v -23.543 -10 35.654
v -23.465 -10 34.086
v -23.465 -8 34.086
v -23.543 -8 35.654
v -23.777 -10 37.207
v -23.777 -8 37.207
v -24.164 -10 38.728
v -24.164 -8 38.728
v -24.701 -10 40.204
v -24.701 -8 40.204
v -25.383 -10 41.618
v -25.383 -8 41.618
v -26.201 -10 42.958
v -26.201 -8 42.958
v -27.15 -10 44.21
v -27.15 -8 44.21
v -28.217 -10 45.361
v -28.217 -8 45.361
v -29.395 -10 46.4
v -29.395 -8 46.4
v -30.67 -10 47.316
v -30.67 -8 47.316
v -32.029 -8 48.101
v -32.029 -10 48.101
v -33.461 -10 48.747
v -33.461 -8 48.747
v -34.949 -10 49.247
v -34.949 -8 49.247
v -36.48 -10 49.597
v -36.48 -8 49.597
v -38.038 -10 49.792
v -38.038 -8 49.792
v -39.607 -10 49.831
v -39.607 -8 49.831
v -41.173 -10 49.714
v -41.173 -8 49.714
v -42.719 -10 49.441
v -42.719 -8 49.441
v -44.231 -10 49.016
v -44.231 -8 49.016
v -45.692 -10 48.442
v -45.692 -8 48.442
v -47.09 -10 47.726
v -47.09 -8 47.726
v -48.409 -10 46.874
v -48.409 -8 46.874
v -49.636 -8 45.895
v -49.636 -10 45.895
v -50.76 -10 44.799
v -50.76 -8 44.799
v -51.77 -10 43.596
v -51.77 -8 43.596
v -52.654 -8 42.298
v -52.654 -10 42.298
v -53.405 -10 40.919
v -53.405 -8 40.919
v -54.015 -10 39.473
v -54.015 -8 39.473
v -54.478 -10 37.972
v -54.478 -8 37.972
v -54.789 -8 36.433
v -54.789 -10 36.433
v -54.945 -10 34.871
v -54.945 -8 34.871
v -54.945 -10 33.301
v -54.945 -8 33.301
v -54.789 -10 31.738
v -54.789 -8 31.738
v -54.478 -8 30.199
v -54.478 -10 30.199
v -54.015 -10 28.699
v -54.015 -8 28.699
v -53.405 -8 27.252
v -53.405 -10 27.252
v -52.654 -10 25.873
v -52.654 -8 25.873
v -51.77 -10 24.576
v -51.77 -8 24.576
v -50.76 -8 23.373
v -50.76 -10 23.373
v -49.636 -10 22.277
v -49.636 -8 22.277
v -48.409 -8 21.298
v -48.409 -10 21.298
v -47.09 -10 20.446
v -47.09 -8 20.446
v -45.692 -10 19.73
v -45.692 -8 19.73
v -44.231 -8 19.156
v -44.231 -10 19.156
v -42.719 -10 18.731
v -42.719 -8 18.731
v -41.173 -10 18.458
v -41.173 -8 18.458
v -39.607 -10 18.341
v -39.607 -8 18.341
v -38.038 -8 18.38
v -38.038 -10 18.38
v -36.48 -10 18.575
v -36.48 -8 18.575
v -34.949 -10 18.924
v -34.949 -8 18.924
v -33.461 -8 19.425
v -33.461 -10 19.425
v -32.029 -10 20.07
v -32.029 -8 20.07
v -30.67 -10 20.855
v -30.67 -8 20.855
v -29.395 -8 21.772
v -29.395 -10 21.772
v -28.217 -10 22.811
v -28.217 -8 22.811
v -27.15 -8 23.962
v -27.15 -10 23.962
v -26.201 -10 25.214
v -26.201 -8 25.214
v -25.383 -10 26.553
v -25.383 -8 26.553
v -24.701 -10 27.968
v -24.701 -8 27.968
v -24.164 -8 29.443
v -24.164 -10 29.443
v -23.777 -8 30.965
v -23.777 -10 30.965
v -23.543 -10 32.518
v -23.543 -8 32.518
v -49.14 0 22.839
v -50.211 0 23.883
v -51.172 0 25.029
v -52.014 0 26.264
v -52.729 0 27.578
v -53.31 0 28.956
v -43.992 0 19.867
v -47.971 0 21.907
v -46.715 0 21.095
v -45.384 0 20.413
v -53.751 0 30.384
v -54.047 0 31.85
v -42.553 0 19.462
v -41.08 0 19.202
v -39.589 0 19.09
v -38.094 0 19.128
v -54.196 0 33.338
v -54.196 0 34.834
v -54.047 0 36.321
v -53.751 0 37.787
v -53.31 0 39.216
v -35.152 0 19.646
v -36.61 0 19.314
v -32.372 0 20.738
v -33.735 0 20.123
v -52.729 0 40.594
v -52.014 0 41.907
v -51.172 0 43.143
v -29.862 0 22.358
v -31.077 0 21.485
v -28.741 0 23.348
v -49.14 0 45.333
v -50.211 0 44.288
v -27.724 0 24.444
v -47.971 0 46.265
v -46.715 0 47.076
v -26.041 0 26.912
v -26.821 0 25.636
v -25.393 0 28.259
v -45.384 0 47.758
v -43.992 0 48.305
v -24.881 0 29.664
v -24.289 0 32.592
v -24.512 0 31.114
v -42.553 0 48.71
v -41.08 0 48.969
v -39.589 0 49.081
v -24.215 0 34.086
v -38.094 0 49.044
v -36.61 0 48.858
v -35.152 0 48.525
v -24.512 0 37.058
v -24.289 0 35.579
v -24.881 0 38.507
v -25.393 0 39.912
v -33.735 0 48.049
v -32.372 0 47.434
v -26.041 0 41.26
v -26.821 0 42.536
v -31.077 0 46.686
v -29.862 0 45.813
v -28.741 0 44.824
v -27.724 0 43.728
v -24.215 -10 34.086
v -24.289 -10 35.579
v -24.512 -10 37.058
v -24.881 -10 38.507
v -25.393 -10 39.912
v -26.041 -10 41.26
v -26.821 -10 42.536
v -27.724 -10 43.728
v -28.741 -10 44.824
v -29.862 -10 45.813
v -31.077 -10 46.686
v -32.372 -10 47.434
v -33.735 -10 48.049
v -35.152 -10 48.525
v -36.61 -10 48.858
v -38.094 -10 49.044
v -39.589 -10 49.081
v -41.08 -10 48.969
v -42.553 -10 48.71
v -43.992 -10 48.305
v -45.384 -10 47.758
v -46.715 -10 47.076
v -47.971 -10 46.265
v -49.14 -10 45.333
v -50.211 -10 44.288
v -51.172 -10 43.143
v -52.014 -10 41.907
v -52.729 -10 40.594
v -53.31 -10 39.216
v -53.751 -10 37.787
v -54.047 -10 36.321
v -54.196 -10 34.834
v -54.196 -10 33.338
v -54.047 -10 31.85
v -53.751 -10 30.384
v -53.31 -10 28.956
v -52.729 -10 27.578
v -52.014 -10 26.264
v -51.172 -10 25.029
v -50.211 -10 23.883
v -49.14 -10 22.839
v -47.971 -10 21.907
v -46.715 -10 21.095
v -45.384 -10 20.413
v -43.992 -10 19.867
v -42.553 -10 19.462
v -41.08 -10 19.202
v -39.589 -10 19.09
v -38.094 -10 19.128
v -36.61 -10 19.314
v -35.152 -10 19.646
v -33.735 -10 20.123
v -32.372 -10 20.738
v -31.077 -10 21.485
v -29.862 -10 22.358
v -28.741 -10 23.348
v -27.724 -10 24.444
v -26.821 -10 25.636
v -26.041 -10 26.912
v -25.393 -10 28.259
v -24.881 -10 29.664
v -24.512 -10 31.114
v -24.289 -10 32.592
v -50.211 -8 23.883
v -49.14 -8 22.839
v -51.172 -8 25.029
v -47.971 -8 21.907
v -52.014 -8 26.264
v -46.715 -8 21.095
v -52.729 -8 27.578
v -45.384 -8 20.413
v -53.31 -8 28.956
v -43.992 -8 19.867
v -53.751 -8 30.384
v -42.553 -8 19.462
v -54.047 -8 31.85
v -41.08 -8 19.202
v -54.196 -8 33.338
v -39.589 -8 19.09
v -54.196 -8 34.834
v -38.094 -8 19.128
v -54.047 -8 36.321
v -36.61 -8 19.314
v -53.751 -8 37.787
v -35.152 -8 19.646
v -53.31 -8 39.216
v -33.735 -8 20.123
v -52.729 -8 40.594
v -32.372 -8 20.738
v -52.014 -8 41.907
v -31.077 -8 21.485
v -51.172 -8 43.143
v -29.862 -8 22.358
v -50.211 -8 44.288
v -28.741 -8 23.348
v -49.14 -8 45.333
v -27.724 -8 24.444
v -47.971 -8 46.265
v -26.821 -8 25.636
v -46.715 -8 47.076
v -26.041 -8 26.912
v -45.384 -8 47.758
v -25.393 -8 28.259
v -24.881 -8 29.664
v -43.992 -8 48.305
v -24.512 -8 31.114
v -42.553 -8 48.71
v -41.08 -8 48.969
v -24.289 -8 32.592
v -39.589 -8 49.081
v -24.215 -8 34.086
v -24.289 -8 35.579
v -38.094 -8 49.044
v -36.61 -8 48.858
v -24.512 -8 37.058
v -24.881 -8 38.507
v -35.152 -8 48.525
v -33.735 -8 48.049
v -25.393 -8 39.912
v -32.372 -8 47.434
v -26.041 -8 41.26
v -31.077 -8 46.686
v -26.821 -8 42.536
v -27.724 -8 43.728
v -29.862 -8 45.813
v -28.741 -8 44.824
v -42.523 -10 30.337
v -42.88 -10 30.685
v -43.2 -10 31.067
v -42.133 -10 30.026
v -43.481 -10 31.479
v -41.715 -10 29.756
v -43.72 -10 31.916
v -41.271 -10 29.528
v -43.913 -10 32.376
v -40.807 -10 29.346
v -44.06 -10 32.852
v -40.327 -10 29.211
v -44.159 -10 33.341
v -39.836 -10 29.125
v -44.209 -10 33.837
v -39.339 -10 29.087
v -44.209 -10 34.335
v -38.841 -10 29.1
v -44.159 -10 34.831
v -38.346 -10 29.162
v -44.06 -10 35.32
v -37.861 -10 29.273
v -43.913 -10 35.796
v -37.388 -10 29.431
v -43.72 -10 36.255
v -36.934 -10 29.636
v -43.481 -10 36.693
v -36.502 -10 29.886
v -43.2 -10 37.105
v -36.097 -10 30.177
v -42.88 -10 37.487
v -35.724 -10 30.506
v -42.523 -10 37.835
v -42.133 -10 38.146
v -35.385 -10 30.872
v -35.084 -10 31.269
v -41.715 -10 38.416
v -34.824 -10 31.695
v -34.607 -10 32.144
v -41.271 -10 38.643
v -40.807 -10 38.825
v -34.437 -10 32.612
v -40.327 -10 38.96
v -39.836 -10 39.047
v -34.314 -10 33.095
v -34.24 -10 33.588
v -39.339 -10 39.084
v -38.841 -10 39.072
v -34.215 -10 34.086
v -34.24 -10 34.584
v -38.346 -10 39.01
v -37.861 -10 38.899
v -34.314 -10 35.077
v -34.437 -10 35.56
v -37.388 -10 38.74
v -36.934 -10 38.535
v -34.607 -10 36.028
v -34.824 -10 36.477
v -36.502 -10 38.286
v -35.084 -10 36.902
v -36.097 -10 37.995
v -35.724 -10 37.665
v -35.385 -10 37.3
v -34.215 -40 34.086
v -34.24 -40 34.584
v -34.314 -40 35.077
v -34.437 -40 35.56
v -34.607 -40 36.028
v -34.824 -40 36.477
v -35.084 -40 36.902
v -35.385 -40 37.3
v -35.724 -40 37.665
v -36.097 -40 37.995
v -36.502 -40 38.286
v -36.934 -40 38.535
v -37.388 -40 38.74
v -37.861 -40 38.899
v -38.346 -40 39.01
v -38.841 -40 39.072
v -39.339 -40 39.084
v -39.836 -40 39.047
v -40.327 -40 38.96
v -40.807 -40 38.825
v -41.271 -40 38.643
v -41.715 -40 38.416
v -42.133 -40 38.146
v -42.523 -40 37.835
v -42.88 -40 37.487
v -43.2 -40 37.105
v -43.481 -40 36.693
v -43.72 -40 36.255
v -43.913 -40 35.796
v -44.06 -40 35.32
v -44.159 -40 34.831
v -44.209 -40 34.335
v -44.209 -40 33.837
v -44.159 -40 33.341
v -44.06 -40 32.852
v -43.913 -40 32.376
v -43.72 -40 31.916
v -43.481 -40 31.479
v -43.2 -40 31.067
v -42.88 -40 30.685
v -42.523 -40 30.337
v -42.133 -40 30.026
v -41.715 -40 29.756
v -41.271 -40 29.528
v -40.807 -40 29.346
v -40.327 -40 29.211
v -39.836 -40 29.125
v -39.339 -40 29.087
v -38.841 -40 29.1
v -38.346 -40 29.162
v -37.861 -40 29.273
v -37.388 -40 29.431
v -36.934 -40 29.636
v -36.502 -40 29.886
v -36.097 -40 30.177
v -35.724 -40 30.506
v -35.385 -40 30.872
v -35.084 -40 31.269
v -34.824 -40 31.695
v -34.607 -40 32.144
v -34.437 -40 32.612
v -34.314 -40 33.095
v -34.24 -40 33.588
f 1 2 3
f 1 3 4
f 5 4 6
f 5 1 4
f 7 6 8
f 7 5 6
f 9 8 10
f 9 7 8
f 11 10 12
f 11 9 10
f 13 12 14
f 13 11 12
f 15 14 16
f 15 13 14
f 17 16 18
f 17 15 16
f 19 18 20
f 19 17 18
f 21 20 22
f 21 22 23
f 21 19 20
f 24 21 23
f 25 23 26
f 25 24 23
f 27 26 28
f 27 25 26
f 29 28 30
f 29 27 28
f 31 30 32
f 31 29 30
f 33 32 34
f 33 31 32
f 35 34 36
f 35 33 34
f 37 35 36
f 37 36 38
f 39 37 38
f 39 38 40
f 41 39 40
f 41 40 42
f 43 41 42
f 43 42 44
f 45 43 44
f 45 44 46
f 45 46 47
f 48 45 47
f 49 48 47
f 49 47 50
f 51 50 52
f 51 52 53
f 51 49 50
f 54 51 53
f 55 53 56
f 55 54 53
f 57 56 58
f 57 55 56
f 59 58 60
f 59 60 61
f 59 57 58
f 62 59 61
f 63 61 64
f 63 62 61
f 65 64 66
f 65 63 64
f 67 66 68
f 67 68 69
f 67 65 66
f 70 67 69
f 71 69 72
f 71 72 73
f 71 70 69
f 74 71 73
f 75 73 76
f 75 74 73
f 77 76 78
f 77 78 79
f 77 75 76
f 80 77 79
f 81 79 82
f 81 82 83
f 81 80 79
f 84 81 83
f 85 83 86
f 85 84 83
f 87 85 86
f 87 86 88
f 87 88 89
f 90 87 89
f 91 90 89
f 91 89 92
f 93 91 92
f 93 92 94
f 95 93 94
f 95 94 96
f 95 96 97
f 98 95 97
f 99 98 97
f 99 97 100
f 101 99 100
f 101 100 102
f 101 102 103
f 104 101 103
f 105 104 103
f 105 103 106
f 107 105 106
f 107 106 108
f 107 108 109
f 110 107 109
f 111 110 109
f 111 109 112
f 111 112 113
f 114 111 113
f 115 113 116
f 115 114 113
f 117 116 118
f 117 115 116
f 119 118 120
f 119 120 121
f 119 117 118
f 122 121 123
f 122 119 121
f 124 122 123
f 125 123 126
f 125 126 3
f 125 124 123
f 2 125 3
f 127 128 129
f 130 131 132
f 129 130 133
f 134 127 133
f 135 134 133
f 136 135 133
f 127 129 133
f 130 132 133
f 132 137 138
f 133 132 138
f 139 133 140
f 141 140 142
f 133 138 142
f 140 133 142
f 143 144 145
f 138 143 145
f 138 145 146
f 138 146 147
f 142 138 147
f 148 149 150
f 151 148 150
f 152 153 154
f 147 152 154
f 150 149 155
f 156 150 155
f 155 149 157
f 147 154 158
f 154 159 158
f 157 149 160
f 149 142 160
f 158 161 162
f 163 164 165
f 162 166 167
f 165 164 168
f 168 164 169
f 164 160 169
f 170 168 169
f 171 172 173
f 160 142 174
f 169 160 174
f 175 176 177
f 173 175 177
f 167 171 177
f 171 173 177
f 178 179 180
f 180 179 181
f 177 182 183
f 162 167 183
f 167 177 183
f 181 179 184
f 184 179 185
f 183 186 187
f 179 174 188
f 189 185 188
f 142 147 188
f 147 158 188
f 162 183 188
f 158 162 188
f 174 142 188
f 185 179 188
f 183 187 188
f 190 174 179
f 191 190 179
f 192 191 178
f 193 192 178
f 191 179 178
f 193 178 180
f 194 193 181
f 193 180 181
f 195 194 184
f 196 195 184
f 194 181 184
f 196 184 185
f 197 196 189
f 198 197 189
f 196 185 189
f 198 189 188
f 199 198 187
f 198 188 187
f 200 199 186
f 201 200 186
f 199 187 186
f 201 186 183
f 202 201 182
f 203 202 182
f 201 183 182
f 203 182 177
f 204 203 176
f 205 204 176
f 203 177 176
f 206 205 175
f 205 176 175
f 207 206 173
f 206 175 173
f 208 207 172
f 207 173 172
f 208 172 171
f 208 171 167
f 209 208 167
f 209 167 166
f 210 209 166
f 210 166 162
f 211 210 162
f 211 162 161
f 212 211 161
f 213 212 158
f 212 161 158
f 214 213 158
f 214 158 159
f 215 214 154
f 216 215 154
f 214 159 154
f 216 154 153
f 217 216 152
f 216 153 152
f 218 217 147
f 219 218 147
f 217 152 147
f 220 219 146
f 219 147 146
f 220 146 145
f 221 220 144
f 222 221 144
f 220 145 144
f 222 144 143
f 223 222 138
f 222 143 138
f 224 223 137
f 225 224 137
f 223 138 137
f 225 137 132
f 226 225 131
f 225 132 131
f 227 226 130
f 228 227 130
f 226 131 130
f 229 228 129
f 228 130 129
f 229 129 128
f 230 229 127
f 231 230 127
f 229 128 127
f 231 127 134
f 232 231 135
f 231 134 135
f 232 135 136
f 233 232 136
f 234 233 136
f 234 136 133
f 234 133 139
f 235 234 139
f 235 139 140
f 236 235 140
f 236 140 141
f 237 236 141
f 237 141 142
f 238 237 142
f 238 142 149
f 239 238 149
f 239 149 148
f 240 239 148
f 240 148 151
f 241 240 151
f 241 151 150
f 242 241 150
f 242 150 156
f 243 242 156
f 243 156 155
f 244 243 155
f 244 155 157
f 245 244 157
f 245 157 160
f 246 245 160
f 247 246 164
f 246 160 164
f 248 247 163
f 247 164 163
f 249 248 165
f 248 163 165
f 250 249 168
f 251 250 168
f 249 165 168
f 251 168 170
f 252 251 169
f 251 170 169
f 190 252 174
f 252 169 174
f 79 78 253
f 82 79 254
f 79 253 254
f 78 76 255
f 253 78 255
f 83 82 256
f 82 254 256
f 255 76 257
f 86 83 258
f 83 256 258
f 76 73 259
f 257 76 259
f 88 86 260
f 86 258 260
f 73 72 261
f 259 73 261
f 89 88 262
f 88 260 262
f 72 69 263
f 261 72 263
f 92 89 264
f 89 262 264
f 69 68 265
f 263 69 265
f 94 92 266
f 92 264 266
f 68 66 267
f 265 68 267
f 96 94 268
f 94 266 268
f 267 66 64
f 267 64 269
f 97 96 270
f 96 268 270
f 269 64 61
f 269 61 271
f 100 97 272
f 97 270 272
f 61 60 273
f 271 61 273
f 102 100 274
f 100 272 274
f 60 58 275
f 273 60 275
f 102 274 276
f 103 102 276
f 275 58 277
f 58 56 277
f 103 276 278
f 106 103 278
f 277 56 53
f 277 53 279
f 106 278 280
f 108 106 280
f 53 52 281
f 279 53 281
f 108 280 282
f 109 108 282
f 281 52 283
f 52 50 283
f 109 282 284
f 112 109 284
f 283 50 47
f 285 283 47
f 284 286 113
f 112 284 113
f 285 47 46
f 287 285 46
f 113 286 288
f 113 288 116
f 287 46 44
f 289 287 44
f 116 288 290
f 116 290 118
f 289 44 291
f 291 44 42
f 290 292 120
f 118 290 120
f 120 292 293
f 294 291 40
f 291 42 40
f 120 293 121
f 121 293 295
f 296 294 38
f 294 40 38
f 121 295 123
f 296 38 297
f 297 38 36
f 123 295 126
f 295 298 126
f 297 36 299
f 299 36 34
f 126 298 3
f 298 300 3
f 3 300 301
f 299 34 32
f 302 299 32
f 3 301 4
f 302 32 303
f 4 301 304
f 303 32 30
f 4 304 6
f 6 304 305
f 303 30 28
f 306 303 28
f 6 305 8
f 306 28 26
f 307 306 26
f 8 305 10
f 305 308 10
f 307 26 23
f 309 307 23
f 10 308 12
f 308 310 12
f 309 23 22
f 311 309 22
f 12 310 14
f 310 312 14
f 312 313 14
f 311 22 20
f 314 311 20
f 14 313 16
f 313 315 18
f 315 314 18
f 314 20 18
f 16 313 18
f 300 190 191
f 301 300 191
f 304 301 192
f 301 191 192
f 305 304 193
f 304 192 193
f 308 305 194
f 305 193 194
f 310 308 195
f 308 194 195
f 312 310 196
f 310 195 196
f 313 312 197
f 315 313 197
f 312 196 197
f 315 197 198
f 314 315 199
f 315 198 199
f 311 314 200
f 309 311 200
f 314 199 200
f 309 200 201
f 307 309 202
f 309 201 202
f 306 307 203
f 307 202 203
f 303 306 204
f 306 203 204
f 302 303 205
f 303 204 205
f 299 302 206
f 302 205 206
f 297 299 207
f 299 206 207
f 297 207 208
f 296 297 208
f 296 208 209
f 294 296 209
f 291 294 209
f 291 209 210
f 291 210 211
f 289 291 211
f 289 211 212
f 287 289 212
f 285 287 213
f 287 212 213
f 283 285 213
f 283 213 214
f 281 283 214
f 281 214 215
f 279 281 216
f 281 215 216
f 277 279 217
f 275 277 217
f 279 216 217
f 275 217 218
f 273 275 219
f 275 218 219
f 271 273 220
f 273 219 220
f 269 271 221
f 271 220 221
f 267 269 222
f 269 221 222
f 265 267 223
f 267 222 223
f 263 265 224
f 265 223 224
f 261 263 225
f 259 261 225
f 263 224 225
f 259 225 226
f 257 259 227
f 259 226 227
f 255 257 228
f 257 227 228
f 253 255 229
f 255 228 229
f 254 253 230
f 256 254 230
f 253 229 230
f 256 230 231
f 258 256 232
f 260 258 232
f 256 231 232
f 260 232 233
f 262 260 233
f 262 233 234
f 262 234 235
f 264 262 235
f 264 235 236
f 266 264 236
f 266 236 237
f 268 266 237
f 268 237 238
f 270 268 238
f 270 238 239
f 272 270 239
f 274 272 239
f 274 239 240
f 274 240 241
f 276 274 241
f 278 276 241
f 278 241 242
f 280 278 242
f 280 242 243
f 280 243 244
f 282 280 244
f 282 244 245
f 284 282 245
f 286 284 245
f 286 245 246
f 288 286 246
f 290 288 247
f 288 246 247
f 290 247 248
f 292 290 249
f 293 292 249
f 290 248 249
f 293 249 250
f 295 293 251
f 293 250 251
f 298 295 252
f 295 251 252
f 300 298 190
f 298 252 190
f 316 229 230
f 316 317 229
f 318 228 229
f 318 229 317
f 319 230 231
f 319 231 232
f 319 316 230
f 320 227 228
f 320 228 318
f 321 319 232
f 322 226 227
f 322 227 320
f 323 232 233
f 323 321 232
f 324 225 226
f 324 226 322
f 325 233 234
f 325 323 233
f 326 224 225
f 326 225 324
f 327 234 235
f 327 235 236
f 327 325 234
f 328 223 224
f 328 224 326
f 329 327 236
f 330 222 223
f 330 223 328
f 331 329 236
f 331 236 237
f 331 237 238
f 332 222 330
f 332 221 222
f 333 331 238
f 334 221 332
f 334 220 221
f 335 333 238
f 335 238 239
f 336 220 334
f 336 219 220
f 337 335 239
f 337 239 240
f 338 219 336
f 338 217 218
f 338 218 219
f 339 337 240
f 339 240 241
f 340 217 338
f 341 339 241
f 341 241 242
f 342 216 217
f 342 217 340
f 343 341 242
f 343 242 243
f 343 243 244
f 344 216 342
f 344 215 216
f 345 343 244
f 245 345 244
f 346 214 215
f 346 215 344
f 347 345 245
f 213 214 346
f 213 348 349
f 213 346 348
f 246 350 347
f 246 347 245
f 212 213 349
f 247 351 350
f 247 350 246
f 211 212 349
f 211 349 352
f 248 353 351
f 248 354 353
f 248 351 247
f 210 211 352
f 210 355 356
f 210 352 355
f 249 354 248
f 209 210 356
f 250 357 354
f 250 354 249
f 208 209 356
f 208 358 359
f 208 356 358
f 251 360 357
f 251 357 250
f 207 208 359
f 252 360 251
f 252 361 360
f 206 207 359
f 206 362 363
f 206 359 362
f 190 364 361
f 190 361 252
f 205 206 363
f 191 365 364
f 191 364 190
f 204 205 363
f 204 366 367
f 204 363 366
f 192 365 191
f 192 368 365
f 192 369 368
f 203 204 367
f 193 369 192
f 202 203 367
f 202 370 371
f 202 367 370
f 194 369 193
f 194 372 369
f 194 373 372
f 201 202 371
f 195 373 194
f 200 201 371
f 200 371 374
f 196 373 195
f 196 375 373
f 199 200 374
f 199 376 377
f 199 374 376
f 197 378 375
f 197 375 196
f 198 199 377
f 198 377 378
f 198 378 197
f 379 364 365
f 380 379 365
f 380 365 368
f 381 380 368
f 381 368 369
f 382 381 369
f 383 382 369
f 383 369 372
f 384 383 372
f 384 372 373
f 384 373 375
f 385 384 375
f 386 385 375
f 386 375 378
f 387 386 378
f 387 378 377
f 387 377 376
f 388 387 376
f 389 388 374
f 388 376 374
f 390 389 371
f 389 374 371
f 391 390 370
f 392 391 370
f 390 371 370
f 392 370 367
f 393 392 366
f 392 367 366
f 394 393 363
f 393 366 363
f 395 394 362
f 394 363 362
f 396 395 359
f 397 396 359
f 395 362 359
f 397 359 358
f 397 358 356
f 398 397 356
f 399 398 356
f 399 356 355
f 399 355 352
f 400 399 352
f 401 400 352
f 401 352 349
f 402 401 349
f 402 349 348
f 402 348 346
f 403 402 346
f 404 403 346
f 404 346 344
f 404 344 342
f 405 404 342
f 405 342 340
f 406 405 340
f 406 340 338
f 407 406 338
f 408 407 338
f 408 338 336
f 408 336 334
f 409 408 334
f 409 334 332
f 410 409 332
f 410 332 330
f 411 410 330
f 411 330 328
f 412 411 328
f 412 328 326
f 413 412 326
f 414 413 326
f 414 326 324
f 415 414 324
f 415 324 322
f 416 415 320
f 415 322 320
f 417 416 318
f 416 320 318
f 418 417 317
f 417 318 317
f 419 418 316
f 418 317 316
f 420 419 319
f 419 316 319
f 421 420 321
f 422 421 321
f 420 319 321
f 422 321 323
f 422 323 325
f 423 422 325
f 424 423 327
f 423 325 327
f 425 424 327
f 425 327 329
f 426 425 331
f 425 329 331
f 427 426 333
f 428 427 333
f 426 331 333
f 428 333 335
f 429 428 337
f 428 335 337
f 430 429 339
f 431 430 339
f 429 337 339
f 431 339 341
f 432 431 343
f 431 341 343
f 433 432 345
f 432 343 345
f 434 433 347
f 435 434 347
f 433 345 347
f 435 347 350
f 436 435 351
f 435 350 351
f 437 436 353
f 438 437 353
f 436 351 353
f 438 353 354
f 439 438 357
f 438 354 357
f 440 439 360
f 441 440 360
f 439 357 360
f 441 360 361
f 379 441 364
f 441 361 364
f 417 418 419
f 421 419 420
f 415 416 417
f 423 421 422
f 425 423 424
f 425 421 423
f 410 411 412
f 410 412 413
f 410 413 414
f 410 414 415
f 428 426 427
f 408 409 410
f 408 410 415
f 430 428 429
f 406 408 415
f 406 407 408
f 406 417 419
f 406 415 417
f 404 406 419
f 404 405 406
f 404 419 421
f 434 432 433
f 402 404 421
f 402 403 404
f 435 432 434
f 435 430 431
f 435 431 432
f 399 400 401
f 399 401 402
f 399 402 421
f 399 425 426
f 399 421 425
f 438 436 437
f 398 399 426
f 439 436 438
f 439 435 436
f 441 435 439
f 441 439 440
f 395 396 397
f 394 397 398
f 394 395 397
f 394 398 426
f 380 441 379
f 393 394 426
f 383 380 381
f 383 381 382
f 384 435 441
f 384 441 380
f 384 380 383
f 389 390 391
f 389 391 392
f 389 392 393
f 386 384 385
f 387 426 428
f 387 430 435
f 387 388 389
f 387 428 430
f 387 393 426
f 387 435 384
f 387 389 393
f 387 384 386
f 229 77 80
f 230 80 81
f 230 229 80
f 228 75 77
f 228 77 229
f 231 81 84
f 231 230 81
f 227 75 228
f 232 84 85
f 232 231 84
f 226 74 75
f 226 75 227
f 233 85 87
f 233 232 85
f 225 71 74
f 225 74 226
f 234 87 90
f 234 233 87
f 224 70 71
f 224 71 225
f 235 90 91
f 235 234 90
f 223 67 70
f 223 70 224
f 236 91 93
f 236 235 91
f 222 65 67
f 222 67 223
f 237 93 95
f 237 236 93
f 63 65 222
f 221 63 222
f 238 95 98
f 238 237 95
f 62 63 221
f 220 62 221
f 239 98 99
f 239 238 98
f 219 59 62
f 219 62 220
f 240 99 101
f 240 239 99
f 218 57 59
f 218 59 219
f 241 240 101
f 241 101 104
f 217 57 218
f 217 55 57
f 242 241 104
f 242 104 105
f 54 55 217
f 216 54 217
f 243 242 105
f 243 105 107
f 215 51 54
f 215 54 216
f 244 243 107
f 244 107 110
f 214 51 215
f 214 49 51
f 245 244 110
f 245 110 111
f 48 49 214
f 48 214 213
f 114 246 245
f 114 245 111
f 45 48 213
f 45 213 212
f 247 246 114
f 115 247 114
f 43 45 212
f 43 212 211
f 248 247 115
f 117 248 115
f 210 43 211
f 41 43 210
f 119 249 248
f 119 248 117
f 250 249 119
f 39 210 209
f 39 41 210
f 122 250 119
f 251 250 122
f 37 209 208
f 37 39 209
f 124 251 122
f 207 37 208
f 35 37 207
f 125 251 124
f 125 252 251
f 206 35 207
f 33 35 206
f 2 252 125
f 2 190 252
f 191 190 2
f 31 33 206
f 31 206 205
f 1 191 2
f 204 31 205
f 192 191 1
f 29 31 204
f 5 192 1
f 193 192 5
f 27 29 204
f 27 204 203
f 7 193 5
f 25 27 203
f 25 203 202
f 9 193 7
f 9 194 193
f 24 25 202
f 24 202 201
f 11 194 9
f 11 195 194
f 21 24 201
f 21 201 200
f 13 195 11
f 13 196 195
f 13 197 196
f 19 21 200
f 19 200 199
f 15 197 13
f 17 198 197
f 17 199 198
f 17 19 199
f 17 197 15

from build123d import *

# Parameters (mm, degrees)
F0_R     = 15
F0_R_2   = 5
F1_DEPTH = 10
F2_DEPTH = 40
F4_R     = 15.75
F4_R_2   = 15
F5_DEPTH = 2


with BuildPart() as f1:
    # F0 (on Front) → F1 (new body)
    with BuildSketch(Plane.XZ):
        with Locations((-39.214723, 34.085821)):
            Circle(F0_R)
        with Locations((-39.214723, 34.085821)):
            Circle(F0_R_2, mode=Mode.SUBTRACT)
    extrude(amount=F1_DEPTH)

    # F0 (on Front) → F2 (join)
    with BuildSketch(Plane.XZ):
        with Locations((-39.214723, 34.085821)):
            Circle(F0_R_2)
    extrude(amount=F2_DEPTH)


with BuildPart() as f5:
    # F4 (on face) → F5 (new body)
    with BuildSketch(Plane.XZ.offset(10)):
        with Locations((-39.214723, 34.085821)):
            Circle(F4_R)
        with Locations((-39.214723, 34.085821)):
            Circle(F4_R_2, mode=Mode.SUBTRACT)
    extrude(amount=-F5_DEPTH)


solid = Compound([f1.part, f5.part])
